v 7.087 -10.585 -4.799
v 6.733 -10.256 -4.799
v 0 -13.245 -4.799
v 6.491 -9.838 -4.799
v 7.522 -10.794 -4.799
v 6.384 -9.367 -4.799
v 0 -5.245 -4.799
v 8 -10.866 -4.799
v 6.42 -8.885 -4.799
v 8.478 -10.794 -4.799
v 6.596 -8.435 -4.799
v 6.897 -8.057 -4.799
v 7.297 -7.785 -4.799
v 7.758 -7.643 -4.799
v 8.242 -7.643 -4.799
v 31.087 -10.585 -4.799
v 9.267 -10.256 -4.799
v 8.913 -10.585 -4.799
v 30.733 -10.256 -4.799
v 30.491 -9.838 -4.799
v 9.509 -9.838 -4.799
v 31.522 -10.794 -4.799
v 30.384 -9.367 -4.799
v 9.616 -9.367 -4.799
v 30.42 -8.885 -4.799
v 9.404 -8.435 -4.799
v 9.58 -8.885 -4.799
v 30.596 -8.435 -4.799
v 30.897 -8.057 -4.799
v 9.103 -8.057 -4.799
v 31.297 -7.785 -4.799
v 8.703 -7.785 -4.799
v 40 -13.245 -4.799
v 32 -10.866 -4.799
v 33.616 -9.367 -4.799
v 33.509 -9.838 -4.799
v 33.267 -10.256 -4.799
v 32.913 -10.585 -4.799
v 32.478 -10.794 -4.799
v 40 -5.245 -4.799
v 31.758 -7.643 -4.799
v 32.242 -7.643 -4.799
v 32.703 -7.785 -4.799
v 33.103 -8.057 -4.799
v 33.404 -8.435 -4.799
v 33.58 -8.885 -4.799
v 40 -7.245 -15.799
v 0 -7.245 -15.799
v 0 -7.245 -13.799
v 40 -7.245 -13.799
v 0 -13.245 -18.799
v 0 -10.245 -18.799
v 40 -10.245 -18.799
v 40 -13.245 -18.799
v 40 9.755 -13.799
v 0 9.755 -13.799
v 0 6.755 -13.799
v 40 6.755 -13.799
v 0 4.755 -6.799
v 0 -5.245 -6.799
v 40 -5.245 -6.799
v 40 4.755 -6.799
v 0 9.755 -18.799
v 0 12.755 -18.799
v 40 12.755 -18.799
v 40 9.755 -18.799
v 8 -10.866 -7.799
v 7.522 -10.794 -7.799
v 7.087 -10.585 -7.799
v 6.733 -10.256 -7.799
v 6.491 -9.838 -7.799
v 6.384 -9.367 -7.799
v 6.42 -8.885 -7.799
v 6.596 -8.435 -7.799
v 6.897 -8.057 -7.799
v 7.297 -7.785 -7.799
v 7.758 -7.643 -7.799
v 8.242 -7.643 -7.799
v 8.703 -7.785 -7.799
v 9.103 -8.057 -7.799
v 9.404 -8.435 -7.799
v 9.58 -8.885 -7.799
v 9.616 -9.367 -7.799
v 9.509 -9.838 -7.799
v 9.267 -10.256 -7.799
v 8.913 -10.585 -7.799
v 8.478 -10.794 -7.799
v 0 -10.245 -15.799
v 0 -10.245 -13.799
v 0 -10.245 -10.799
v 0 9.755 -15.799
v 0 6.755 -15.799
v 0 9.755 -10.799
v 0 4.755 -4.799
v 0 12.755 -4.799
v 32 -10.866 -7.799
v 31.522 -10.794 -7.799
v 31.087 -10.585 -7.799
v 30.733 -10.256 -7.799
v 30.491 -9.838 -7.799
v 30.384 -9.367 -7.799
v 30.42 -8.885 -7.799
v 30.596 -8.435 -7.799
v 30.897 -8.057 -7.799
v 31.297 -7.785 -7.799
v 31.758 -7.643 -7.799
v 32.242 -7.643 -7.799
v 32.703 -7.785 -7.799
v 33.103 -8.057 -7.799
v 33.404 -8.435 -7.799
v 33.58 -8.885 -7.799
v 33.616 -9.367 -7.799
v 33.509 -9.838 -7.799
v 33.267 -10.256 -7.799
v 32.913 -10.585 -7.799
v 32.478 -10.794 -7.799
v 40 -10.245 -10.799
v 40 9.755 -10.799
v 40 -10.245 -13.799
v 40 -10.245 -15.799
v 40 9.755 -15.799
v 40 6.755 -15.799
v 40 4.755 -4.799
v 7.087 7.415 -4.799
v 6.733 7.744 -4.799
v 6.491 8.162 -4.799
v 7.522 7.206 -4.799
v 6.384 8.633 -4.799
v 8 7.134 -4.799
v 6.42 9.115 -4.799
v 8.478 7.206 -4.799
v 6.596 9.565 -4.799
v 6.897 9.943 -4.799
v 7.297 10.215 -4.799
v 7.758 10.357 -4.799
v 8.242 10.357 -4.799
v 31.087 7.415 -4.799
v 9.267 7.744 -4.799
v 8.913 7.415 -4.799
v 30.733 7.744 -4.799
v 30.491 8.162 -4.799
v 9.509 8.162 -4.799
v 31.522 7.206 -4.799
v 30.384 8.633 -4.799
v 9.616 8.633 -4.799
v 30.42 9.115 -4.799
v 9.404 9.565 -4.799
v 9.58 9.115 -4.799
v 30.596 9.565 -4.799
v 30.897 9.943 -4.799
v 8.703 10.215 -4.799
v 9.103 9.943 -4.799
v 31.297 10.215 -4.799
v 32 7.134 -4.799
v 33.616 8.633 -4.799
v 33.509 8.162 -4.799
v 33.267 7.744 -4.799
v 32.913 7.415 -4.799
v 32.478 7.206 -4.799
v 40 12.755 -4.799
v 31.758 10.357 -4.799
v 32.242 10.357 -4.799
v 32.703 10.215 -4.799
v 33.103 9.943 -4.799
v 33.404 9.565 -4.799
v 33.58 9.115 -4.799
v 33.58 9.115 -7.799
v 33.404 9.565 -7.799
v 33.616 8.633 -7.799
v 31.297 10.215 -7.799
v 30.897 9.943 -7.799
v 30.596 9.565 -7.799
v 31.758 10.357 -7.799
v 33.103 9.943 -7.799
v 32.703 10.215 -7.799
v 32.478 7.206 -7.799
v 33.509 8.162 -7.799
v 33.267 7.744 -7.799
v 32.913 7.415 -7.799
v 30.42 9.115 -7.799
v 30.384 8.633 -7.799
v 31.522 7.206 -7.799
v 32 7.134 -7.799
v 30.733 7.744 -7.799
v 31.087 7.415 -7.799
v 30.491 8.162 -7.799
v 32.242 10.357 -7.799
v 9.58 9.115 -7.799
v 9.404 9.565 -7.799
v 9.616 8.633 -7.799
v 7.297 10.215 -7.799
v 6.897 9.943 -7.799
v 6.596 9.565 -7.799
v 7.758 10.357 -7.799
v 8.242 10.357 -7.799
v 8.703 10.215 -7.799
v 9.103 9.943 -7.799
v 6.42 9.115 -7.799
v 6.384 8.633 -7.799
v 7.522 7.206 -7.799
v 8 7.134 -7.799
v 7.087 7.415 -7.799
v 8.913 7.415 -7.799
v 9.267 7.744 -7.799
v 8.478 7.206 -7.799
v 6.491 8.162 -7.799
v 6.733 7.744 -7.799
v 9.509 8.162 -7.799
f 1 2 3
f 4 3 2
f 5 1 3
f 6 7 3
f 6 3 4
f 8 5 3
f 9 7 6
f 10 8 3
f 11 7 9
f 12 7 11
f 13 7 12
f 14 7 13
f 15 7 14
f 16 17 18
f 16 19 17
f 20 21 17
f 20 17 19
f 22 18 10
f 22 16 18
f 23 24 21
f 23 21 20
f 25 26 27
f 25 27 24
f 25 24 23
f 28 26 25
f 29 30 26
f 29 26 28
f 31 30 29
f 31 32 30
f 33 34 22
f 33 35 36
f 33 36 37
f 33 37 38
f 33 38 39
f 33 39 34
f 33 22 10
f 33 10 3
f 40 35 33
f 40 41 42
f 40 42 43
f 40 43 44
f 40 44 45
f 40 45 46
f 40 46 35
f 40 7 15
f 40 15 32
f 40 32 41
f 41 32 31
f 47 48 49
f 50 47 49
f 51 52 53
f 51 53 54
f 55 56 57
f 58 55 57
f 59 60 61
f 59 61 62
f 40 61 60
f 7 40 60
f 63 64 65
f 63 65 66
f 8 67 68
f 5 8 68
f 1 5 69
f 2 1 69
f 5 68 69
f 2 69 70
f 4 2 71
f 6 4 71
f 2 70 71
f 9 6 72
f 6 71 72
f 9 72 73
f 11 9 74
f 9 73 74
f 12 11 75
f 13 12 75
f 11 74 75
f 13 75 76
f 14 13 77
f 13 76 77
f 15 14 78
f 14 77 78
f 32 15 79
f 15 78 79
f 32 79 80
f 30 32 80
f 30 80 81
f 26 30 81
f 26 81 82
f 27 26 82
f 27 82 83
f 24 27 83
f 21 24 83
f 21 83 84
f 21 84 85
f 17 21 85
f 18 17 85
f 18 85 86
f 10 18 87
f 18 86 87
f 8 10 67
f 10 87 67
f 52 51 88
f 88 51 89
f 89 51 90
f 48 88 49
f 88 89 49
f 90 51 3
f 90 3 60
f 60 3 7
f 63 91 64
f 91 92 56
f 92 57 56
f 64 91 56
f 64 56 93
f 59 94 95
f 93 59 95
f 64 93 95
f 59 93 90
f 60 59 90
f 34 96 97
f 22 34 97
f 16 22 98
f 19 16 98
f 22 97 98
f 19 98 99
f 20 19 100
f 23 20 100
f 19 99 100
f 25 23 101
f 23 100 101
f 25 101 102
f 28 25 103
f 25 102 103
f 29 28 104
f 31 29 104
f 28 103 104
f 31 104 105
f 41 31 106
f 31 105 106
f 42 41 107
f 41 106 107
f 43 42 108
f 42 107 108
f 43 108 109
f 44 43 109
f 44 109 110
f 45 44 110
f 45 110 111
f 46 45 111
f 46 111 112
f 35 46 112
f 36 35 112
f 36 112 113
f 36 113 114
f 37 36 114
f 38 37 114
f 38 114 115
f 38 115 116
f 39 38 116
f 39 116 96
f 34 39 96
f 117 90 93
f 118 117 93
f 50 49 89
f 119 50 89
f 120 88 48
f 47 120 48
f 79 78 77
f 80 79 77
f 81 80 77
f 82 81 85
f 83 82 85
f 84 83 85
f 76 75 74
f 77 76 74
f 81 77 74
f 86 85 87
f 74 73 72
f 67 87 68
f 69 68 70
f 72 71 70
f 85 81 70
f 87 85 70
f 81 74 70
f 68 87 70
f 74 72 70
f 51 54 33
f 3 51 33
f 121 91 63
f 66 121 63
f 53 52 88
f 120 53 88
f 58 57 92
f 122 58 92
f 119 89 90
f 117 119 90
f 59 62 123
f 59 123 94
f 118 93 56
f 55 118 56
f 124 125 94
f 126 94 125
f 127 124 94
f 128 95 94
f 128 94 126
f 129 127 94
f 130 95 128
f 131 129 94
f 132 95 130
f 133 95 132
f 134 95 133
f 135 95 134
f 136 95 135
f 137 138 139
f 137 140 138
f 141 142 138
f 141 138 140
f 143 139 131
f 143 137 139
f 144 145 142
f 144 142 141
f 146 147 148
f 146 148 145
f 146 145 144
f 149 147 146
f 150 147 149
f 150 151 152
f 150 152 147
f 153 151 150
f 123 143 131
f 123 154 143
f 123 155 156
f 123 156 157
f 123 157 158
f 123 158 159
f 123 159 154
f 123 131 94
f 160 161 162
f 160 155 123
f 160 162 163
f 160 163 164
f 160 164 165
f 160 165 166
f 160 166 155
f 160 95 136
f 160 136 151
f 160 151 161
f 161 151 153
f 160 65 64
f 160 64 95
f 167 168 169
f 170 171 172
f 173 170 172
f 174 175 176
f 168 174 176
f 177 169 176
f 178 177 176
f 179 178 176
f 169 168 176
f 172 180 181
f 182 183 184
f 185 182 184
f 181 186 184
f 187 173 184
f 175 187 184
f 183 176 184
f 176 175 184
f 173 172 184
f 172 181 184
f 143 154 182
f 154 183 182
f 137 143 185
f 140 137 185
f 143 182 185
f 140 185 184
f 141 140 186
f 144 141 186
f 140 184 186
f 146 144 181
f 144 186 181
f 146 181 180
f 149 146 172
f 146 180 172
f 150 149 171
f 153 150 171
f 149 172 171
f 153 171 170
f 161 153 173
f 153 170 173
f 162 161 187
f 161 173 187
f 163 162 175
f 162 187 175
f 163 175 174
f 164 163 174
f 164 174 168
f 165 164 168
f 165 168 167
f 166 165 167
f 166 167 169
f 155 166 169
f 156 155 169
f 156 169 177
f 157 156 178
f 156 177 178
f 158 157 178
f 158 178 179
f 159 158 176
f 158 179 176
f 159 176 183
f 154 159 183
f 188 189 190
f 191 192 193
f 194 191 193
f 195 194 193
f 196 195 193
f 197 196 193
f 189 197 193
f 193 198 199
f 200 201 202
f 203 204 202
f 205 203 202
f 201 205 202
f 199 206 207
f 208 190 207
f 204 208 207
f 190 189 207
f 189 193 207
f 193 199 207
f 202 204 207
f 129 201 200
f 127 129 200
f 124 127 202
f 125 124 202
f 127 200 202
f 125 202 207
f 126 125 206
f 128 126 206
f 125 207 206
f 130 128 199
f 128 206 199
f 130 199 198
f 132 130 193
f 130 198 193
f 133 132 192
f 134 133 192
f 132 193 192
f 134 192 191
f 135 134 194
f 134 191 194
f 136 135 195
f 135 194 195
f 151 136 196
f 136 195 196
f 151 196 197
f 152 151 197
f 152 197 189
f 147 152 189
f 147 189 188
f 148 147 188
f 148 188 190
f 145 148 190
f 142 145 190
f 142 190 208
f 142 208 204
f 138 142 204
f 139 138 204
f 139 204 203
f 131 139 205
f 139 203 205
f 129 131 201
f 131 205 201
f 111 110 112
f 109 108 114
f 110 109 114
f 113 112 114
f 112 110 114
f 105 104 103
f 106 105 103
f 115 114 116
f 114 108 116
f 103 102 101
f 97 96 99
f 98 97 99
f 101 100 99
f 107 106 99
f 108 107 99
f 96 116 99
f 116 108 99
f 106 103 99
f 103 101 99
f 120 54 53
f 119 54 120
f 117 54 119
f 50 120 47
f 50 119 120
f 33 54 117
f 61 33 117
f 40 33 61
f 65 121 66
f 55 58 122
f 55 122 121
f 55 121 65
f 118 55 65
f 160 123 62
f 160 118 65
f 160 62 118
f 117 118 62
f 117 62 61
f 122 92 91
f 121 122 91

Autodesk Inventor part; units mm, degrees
ref_plane "YZ Plane" through (0, 0, 0) normal (1, 0, 0) x (0, 1, 0)
ref_plane "XZ Plane" through (0, 0, 0) normal (0, 1, 0) x (-1, 0, 0)
ref_plane "XY Plane" through (0, 0, 0) normal (0, 0, 1) x (1, 0, 0)
sketch "草图1" plane through (0, 0, 0) normal (1, 0, 0) x (0, 1, 0)
  line L0 (9.7546, -15.7991) -> (9.7546, -18.7991) projected
  line L1 (20.7546, -18.7991) -> (9.7546, -18.7991) projected
  line L2 (20.7546, -18.7991) -> (20.7546, -10.7991) projected
  line L3 (18.7546, -8.7991) -> (20.7546, -10.7991) projected
  line L4 (18.7546, -8.7991) -> (-19.2454, -8.7991) projected
  line L5 (-21.2454, -10.7991) -> (-19.2454, -8.7991) projected
  line L6 (-21.2454, -10.7991) -> (-21.2454, -18.7991) projected
  line L7 (-10.2454, -18.7991) -> (-21.2454, -18.7991) projected
  line L8 (-10.2454, -18.7991) -> (-10.2454, -15.7991) projected
  line L9 (-10.2454, -15.7991) -> (-7.2454, -15.7991) projected
  line L10 (-7.2454, -15.7991) -> (-7.2454, -13.7991) projected
  line L11 (-7.2454, -13.7991) -> (-10.2454, -13.7991) projected
  line L12 (-10.2454, -13.7991) -> (-10.2454, -10.7991) projected
  line L13 (-10.2454, -10.7991) -> (9.7546, -10.7991) projected
  line L14 (9.7546, -10.7991) -> (9.7546, -13.7991) projected
  line L15 (9.7546, -13.7991) -> (6.7546, -13.7991) projected
  line L16 (6.7546, -13.7991) -> (6.7546, -15.7991) projected
  line L17 (6.7546, -15.7991) -> (9.7546, -15.7991) projected
  line L18 (9.7546, -18.7991) -> (12.7546, -18.7991)
  line L19 (12.7546, -18.7991) -> (12.7546, -6.7991)
  line L20 (-10.2454, -18.7991) -> (-13.2454, -18.7991)
  line L21 (-13.2454, -18.7991) -> (-13.2454, -6.7991)
  line L22 (-13.2454, -6.7991) -> (12.7546, -6.7991)
  dimension "d0" = 3
  dimension "d1" = 12
extrude "拉伸1" add sketch "草图1" along normal blind 40 contours L17 L16 L15 L14 L13 L12 L11 L10 L9 L8 L7 L21 L4 L19 L1 L0 | L4 L21 L22 L19
sketch "草图2" plane through (0, -13.2454, -6.7991) normal (0, 0, 1) x (1, 0, 0)
  line L0 (40, 26) -> (40, 0) projected
  line L1 (0, 0) -> (40, 0)
  line L2 (40, 0) -> (40, 8)
  line L3 (40, 8) -> (0, 8)
  line L4 (0, 8) -> (0, 0)
  line L5 (0, 26) -> (40, 26) projected
  line L6 (0, 26) -> (40, 26)
  line L7 (40, 26) -> (40, 18)
  line L8 (40, 18) -> (0, 18)
  line L9 (0, 18) -> (0, 26)
  point P0 (0, 13.2454)
  dimension "d4" = 8
  dimension "d5" = 8
extrude "拉伸2" add sketch "草图2" along normal blind 2
sketch "草图3" plane through (0, -13.2454, -4.7991) normal (0, 0, 1) x (1, 0, 0)
  line L0 (40, 26) -> (0, 26) projected
  line L1 (0, 26) -> (0, 18) projected
  line L2 (40, 18) -> (40, 26) projected
  line L3 (0, 0) -> (40, 0) projected
  point P0 (0, 13.2454)
  point P1 (8, 22)
  point P2 (32, 22)
  point P3 (32, 4)
  point P4 (8, 4)
  dimension "d8" = 4
  dimension "d9" = 8
  dimension "d10" = 8
  dimension "d11" = 4
hole "孔1" at (8, 8.7546, -4.7991) at (32, 8.7546, -4.7991) at (32, -9.2454, -4.7991) at (8, -9.2454, -4.7991) direction (0, 0, -1) diameter 3.242 depth 3 thread size "M4x0.7" designation "M4" class "6H" standard "GB Metric profile"
properties part number "滑块3"
